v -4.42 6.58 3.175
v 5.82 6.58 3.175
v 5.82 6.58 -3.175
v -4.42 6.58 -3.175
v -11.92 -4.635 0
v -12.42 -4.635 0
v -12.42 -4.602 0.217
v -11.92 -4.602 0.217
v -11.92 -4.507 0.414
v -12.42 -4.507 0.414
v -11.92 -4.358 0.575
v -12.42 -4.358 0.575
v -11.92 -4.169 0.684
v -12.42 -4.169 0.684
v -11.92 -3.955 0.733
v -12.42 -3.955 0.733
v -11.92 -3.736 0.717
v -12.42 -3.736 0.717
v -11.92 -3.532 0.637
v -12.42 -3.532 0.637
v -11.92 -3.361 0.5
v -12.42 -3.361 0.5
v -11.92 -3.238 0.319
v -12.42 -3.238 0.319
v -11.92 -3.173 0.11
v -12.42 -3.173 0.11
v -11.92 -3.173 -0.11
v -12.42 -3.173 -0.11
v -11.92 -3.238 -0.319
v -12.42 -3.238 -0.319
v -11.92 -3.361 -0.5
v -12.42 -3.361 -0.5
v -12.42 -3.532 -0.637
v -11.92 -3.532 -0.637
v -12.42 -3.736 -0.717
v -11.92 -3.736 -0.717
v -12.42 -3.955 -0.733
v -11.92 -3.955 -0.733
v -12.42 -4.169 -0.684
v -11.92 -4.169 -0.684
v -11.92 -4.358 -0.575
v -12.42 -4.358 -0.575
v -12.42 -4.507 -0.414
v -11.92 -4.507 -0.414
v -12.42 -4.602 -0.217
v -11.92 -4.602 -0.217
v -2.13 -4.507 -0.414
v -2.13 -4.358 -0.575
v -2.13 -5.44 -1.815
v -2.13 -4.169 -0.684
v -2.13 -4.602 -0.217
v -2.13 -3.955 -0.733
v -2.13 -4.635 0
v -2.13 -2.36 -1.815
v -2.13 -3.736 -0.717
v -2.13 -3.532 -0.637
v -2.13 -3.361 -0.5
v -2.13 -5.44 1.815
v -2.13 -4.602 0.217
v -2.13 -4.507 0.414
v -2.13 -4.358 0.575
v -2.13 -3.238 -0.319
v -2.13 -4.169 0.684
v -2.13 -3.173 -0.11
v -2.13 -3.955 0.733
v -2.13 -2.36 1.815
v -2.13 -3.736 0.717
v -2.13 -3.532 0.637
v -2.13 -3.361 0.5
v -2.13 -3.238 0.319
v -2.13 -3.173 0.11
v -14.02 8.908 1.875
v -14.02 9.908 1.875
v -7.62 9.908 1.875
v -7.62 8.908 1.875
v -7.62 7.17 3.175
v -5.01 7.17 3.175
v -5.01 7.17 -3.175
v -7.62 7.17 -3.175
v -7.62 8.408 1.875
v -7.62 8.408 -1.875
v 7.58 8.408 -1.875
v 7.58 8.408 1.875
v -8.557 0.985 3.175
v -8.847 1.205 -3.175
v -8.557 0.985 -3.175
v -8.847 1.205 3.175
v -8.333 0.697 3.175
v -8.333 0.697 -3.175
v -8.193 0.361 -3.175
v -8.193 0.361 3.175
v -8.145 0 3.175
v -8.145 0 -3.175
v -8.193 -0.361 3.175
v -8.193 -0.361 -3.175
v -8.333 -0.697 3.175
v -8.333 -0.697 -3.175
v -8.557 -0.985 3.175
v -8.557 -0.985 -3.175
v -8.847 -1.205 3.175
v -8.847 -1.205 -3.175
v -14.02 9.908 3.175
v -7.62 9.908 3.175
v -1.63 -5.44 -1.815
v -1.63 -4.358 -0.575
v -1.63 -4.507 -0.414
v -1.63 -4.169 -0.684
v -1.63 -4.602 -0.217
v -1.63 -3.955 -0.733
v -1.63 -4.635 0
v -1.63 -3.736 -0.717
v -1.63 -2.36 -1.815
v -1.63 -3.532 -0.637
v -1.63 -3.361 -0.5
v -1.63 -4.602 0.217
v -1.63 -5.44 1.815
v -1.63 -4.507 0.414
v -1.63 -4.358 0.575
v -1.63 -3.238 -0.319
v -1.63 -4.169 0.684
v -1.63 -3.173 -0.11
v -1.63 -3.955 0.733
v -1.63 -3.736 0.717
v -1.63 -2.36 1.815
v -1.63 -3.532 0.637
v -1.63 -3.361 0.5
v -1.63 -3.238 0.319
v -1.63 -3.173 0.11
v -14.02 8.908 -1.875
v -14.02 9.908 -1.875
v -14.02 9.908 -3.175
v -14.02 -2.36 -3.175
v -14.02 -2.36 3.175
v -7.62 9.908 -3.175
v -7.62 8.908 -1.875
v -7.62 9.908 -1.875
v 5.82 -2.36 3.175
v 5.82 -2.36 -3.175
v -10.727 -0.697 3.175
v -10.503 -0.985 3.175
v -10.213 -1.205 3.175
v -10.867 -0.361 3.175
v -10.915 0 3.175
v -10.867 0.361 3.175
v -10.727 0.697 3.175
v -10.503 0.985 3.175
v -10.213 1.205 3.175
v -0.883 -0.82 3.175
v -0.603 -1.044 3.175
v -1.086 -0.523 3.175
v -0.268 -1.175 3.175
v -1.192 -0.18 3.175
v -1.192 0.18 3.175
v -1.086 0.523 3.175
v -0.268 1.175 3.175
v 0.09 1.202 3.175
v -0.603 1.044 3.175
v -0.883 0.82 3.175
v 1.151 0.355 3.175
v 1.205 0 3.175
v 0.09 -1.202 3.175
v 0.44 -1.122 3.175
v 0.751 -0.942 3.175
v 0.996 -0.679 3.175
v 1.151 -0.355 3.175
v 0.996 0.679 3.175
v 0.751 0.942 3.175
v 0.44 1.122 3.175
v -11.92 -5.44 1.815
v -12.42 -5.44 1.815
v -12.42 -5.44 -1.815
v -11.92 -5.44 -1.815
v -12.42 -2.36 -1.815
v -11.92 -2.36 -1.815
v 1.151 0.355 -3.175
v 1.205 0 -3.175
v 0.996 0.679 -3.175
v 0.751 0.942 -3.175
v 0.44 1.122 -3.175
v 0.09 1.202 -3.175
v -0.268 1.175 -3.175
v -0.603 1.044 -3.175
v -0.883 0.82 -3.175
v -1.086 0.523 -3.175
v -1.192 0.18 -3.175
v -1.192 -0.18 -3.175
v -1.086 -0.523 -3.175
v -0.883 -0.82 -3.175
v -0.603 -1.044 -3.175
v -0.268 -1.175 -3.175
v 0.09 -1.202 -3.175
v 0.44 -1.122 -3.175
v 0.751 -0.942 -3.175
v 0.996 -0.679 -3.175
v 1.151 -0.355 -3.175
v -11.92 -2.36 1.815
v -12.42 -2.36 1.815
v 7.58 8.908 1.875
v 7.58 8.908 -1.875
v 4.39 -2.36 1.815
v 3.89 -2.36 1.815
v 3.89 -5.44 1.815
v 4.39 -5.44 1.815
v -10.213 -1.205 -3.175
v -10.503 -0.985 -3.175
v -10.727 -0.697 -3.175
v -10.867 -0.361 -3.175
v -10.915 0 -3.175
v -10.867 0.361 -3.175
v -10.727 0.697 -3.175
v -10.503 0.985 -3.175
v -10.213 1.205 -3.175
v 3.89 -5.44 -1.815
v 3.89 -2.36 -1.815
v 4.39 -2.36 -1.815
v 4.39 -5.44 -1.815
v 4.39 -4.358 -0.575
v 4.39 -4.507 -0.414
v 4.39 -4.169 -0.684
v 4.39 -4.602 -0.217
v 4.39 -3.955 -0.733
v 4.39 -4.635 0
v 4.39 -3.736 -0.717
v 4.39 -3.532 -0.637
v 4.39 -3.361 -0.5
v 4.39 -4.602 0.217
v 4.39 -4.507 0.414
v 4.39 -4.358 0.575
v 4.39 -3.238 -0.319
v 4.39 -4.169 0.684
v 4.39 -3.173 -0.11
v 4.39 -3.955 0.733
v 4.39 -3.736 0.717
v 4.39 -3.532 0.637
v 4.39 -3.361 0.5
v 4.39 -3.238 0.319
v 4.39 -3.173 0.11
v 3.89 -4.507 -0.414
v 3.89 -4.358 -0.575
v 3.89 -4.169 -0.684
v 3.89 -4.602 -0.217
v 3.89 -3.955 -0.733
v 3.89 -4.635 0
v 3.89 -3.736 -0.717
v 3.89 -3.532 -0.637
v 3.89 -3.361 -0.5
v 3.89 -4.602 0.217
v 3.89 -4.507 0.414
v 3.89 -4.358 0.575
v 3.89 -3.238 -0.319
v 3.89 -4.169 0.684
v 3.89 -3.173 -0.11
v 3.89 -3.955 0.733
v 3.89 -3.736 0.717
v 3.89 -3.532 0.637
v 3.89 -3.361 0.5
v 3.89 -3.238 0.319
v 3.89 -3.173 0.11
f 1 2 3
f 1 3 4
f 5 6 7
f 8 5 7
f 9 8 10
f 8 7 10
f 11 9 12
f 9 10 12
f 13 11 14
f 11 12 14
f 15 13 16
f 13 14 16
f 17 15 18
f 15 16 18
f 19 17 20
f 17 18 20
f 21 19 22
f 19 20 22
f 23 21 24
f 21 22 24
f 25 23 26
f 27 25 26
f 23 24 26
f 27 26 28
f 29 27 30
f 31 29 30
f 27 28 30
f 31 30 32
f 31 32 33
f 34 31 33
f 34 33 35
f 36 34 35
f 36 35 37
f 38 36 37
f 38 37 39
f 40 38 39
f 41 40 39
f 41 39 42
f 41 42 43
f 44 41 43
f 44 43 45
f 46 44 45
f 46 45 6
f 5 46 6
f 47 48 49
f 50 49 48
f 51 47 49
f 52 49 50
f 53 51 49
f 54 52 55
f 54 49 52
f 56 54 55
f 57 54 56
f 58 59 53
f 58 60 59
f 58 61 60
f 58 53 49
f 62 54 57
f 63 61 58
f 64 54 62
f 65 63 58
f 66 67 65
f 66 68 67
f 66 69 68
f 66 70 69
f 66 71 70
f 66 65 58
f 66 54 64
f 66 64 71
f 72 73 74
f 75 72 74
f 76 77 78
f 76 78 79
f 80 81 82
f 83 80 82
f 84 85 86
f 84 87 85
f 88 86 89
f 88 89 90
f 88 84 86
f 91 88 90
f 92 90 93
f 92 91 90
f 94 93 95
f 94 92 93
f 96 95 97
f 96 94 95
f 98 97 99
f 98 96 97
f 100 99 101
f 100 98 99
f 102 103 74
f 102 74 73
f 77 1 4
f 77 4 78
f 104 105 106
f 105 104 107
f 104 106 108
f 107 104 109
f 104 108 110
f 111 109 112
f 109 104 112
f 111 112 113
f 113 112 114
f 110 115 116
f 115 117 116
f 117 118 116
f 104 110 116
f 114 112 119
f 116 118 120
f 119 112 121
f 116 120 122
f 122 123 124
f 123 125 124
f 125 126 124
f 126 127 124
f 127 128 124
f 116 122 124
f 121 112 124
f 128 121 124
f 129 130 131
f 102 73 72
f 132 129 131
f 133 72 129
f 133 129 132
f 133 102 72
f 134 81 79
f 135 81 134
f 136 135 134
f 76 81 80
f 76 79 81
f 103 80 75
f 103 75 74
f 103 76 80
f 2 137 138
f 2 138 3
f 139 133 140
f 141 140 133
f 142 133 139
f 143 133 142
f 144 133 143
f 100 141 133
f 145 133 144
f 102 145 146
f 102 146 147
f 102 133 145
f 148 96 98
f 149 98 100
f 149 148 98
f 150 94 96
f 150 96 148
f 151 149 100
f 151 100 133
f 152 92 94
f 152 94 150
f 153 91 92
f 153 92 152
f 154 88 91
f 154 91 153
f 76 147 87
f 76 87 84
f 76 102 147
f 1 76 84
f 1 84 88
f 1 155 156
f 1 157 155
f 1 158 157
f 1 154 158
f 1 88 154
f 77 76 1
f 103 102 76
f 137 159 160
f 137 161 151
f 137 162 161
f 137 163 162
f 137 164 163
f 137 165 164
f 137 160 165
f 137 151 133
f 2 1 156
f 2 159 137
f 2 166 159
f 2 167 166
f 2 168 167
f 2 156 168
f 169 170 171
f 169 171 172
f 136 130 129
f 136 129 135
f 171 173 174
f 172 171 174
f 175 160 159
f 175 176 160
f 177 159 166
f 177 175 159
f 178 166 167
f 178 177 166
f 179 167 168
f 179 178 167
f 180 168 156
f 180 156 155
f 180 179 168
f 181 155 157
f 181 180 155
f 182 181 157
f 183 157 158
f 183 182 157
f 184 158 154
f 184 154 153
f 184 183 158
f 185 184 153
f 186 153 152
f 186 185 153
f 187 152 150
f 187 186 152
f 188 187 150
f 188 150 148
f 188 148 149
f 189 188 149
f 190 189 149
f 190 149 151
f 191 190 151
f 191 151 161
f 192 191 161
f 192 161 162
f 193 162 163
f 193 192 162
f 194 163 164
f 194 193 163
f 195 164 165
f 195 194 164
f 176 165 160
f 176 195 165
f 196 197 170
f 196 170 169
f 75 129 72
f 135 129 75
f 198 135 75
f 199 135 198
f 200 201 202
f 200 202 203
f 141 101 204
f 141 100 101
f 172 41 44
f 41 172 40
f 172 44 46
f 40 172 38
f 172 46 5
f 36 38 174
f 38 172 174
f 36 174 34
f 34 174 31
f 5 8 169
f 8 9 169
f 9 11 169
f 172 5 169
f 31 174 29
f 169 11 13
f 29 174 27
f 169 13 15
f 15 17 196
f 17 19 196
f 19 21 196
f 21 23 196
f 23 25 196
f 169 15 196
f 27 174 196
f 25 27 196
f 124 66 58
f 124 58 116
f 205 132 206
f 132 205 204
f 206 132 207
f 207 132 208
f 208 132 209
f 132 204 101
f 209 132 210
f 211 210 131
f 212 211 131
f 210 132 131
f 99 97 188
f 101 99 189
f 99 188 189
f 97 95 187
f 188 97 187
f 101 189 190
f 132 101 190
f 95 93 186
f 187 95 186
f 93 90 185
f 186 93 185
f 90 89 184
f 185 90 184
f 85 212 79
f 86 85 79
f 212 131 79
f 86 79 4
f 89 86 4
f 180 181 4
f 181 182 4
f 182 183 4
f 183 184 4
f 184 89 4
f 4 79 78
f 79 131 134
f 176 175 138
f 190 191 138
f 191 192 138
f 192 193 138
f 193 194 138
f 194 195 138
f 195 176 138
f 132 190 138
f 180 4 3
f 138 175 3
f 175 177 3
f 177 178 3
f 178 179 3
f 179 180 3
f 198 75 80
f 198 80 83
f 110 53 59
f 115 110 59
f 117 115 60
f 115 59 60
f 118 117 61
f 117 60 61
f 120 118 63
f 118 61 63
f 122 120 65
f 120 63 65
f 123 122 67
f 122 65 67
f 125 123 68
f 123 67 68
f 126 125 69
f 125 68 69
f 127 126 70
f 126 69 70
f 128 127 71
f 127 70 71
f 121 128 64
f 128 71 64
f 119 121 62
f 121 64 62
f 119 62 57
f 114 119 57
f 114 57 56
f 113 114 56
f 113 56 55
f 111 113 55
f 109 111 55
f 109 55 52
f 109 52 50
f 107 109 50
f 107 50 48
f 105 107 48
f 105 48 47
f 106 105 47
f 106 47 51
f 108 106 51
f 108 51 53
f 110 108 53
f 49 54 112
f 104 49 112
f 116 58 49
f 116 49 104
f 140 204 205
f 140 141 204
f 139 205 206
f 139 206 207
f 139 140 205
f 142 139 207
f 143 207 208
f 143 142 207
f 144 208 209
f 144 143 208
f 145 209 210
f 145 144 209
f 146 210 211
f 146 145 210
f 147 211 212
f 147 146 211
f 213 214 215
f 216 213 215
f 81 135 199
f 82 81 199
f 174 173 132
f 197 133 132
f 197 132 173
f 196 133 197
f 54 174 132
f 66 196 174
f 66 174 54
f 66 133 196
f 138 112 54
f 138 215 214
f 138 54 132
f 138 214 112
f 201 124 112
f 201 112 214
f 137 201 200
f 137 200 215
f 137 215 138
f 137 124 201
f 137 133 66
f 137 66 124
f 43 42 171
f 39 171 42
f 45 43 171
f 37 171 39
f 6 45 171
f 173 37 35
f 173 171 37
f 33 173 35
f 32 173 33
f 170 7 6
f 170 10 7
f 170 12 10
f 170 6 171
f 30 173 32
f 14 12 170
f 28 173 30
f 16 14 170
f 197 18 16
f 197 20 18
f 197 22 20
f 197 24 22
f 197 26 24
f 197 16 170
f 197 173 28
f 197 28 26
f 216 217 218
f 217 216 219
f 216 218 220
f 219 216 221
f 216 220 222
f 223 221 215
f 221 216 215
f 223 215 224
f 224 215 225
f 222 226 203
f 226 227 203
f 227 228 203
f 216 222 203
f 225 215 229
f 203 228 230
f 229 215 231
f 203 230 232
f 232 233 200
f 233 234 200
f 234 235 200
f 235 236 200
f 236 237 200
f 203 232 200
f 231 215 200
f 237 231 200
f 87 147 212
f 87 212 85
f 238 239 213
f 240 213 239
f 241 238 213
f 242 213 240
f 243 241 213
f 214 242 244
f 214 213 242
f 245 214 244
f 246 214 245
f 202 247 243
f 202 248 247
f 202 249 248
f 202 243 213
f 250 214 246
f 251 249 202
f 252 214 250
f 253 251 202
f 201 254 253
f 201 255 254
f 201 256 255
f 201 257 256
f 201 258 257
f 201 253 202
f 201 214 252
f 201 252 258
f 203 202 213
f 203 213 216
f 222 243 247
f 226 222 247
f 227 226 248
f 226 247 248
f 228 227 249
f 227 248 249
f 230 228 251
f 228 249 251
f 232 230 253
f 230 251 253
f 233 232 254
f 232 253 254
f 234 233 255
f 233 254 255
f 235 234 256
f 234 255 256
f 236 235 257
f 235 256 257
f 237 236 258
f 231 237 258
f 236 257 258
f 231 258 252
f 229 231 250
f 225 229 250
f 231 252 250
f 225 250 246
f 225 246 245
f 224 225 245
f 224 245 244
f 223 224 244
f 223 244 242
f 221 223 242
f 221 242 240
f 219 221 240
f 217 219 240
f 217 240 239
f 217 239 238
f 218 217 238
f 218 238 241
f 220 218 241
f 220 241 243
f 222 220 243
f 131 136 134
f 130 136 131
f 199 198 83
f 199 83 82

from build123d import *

# Parameters (mm, degrees)
SKETCH_1_R          = 1.205
EXTRUDE_1_DEPTH     = 3.175
SKETCH_2_W          = 0.5
SKETCH_2_H          = 3.63
EXTRUDE_2_DEPTH     = 3.08
SKETCH_3_R          = 0.735
CUT_EXTRUDE_1_DEPTH = 21.998730652
SKETCH_4_W          = 6.4
SKETCH_4_H          = 3.75
CUT_EXTRUDE_2_DEPTH = 1
SKETCH_6_W          = 21.6
SKETCH_6_H          = 3.75
EXTRUDE_3_DEPTH     = 0.5


with BuildPart() as part:
    # 스케치1 → 보스-돌출1 (new, symmetric)
    with BuildSketch(Plane.XY):
        Polygon((-14.02, -2.36), (5.82, -2.36), (5.82, 6.58), (-4.42, 6.58), (-5.01, 7.17), (-7.62, 7.17), (-7.62, 9.908), (-14.02, 9.908), (-14.02, 6.58), align=None)
        Circle(SKETCH_1_R, mode=Mode.SUBTRACT)
        with BuildLine():
            Line((-10.212788401, 1.205), (-8.847211599, 1.205))
            ThreePointArc((-8.847211599, 1.205), (-8.145, 0), (-8.847211599, -1.205))
            Line((-8.847211599, -1.205), (-10.212788401, -1.205))
            ThreePointArc((-10.212788401, -1.205), (-10.915, 0), (-10.212788401, 1.205))
        make_face(mode=Mode.SUBTRACT)
    extrude(amount=EXTRUDE_1_DEPTH, both=True)

    # 스케치2 → 보스-돌출2 (add)
    with BuildSketch(Plane.XZ.offset(2.36)):
        with Locations((-12.17, 0)):
            Rectangle(SKETCH_2_W, SKETCH_2_H)
        with Locations((-1.88, 0)):
            Rectangle(SKETCH_2_W, SKETCH_2_H)
        with Locations((4.14, 0)):
            Rectangle(SKETCH_2_W, SKETCH_2_H)
    extrude(amount=EXTRUDE_2_DEPTH)

    # 스케치3 → 컷-돌출1 (cut, through all)
    with BuildSketch(Plane.ZY.offset(12.42)):
        with Locations(Location((0, -3.9, 0), (0, 0, 270))):
            Circle(SKETCH_3_R)
    extrude(amount=-CUT_EXTRUDE_1_DEPTH, mode=Mode.SUBTRACT)

    # 스케치4 → 컷-돌출2 (cut)
    with BuildSketch(Plane(origin=(0, 9.908, 0), x_dir=(1, 0, 0), z_dir=(0, 1, 0))):
        with Locations((-10.82, 0)):
            Rectangle(SKETCH_4_W, SKETCH_4_H)
    extrude(amount=-CUT_EXTRUDE_2_DEPTH, mode=Mode.SUBTRACT)

    # 스케치6 → 보스-돌출3 (add)
    with BuildSketch(Plane(origin=(0, 8.908, 0), x_dir=(1, 0, 0), z_dir=(0, 1, 0))):
        with Locations((-3.22, 0)):
            Rectangle(SKETCH_6_W, SKETCH_6_H)
    extrude(amount=-EXTRUDE_3_DEPTH)


solid = part.part
